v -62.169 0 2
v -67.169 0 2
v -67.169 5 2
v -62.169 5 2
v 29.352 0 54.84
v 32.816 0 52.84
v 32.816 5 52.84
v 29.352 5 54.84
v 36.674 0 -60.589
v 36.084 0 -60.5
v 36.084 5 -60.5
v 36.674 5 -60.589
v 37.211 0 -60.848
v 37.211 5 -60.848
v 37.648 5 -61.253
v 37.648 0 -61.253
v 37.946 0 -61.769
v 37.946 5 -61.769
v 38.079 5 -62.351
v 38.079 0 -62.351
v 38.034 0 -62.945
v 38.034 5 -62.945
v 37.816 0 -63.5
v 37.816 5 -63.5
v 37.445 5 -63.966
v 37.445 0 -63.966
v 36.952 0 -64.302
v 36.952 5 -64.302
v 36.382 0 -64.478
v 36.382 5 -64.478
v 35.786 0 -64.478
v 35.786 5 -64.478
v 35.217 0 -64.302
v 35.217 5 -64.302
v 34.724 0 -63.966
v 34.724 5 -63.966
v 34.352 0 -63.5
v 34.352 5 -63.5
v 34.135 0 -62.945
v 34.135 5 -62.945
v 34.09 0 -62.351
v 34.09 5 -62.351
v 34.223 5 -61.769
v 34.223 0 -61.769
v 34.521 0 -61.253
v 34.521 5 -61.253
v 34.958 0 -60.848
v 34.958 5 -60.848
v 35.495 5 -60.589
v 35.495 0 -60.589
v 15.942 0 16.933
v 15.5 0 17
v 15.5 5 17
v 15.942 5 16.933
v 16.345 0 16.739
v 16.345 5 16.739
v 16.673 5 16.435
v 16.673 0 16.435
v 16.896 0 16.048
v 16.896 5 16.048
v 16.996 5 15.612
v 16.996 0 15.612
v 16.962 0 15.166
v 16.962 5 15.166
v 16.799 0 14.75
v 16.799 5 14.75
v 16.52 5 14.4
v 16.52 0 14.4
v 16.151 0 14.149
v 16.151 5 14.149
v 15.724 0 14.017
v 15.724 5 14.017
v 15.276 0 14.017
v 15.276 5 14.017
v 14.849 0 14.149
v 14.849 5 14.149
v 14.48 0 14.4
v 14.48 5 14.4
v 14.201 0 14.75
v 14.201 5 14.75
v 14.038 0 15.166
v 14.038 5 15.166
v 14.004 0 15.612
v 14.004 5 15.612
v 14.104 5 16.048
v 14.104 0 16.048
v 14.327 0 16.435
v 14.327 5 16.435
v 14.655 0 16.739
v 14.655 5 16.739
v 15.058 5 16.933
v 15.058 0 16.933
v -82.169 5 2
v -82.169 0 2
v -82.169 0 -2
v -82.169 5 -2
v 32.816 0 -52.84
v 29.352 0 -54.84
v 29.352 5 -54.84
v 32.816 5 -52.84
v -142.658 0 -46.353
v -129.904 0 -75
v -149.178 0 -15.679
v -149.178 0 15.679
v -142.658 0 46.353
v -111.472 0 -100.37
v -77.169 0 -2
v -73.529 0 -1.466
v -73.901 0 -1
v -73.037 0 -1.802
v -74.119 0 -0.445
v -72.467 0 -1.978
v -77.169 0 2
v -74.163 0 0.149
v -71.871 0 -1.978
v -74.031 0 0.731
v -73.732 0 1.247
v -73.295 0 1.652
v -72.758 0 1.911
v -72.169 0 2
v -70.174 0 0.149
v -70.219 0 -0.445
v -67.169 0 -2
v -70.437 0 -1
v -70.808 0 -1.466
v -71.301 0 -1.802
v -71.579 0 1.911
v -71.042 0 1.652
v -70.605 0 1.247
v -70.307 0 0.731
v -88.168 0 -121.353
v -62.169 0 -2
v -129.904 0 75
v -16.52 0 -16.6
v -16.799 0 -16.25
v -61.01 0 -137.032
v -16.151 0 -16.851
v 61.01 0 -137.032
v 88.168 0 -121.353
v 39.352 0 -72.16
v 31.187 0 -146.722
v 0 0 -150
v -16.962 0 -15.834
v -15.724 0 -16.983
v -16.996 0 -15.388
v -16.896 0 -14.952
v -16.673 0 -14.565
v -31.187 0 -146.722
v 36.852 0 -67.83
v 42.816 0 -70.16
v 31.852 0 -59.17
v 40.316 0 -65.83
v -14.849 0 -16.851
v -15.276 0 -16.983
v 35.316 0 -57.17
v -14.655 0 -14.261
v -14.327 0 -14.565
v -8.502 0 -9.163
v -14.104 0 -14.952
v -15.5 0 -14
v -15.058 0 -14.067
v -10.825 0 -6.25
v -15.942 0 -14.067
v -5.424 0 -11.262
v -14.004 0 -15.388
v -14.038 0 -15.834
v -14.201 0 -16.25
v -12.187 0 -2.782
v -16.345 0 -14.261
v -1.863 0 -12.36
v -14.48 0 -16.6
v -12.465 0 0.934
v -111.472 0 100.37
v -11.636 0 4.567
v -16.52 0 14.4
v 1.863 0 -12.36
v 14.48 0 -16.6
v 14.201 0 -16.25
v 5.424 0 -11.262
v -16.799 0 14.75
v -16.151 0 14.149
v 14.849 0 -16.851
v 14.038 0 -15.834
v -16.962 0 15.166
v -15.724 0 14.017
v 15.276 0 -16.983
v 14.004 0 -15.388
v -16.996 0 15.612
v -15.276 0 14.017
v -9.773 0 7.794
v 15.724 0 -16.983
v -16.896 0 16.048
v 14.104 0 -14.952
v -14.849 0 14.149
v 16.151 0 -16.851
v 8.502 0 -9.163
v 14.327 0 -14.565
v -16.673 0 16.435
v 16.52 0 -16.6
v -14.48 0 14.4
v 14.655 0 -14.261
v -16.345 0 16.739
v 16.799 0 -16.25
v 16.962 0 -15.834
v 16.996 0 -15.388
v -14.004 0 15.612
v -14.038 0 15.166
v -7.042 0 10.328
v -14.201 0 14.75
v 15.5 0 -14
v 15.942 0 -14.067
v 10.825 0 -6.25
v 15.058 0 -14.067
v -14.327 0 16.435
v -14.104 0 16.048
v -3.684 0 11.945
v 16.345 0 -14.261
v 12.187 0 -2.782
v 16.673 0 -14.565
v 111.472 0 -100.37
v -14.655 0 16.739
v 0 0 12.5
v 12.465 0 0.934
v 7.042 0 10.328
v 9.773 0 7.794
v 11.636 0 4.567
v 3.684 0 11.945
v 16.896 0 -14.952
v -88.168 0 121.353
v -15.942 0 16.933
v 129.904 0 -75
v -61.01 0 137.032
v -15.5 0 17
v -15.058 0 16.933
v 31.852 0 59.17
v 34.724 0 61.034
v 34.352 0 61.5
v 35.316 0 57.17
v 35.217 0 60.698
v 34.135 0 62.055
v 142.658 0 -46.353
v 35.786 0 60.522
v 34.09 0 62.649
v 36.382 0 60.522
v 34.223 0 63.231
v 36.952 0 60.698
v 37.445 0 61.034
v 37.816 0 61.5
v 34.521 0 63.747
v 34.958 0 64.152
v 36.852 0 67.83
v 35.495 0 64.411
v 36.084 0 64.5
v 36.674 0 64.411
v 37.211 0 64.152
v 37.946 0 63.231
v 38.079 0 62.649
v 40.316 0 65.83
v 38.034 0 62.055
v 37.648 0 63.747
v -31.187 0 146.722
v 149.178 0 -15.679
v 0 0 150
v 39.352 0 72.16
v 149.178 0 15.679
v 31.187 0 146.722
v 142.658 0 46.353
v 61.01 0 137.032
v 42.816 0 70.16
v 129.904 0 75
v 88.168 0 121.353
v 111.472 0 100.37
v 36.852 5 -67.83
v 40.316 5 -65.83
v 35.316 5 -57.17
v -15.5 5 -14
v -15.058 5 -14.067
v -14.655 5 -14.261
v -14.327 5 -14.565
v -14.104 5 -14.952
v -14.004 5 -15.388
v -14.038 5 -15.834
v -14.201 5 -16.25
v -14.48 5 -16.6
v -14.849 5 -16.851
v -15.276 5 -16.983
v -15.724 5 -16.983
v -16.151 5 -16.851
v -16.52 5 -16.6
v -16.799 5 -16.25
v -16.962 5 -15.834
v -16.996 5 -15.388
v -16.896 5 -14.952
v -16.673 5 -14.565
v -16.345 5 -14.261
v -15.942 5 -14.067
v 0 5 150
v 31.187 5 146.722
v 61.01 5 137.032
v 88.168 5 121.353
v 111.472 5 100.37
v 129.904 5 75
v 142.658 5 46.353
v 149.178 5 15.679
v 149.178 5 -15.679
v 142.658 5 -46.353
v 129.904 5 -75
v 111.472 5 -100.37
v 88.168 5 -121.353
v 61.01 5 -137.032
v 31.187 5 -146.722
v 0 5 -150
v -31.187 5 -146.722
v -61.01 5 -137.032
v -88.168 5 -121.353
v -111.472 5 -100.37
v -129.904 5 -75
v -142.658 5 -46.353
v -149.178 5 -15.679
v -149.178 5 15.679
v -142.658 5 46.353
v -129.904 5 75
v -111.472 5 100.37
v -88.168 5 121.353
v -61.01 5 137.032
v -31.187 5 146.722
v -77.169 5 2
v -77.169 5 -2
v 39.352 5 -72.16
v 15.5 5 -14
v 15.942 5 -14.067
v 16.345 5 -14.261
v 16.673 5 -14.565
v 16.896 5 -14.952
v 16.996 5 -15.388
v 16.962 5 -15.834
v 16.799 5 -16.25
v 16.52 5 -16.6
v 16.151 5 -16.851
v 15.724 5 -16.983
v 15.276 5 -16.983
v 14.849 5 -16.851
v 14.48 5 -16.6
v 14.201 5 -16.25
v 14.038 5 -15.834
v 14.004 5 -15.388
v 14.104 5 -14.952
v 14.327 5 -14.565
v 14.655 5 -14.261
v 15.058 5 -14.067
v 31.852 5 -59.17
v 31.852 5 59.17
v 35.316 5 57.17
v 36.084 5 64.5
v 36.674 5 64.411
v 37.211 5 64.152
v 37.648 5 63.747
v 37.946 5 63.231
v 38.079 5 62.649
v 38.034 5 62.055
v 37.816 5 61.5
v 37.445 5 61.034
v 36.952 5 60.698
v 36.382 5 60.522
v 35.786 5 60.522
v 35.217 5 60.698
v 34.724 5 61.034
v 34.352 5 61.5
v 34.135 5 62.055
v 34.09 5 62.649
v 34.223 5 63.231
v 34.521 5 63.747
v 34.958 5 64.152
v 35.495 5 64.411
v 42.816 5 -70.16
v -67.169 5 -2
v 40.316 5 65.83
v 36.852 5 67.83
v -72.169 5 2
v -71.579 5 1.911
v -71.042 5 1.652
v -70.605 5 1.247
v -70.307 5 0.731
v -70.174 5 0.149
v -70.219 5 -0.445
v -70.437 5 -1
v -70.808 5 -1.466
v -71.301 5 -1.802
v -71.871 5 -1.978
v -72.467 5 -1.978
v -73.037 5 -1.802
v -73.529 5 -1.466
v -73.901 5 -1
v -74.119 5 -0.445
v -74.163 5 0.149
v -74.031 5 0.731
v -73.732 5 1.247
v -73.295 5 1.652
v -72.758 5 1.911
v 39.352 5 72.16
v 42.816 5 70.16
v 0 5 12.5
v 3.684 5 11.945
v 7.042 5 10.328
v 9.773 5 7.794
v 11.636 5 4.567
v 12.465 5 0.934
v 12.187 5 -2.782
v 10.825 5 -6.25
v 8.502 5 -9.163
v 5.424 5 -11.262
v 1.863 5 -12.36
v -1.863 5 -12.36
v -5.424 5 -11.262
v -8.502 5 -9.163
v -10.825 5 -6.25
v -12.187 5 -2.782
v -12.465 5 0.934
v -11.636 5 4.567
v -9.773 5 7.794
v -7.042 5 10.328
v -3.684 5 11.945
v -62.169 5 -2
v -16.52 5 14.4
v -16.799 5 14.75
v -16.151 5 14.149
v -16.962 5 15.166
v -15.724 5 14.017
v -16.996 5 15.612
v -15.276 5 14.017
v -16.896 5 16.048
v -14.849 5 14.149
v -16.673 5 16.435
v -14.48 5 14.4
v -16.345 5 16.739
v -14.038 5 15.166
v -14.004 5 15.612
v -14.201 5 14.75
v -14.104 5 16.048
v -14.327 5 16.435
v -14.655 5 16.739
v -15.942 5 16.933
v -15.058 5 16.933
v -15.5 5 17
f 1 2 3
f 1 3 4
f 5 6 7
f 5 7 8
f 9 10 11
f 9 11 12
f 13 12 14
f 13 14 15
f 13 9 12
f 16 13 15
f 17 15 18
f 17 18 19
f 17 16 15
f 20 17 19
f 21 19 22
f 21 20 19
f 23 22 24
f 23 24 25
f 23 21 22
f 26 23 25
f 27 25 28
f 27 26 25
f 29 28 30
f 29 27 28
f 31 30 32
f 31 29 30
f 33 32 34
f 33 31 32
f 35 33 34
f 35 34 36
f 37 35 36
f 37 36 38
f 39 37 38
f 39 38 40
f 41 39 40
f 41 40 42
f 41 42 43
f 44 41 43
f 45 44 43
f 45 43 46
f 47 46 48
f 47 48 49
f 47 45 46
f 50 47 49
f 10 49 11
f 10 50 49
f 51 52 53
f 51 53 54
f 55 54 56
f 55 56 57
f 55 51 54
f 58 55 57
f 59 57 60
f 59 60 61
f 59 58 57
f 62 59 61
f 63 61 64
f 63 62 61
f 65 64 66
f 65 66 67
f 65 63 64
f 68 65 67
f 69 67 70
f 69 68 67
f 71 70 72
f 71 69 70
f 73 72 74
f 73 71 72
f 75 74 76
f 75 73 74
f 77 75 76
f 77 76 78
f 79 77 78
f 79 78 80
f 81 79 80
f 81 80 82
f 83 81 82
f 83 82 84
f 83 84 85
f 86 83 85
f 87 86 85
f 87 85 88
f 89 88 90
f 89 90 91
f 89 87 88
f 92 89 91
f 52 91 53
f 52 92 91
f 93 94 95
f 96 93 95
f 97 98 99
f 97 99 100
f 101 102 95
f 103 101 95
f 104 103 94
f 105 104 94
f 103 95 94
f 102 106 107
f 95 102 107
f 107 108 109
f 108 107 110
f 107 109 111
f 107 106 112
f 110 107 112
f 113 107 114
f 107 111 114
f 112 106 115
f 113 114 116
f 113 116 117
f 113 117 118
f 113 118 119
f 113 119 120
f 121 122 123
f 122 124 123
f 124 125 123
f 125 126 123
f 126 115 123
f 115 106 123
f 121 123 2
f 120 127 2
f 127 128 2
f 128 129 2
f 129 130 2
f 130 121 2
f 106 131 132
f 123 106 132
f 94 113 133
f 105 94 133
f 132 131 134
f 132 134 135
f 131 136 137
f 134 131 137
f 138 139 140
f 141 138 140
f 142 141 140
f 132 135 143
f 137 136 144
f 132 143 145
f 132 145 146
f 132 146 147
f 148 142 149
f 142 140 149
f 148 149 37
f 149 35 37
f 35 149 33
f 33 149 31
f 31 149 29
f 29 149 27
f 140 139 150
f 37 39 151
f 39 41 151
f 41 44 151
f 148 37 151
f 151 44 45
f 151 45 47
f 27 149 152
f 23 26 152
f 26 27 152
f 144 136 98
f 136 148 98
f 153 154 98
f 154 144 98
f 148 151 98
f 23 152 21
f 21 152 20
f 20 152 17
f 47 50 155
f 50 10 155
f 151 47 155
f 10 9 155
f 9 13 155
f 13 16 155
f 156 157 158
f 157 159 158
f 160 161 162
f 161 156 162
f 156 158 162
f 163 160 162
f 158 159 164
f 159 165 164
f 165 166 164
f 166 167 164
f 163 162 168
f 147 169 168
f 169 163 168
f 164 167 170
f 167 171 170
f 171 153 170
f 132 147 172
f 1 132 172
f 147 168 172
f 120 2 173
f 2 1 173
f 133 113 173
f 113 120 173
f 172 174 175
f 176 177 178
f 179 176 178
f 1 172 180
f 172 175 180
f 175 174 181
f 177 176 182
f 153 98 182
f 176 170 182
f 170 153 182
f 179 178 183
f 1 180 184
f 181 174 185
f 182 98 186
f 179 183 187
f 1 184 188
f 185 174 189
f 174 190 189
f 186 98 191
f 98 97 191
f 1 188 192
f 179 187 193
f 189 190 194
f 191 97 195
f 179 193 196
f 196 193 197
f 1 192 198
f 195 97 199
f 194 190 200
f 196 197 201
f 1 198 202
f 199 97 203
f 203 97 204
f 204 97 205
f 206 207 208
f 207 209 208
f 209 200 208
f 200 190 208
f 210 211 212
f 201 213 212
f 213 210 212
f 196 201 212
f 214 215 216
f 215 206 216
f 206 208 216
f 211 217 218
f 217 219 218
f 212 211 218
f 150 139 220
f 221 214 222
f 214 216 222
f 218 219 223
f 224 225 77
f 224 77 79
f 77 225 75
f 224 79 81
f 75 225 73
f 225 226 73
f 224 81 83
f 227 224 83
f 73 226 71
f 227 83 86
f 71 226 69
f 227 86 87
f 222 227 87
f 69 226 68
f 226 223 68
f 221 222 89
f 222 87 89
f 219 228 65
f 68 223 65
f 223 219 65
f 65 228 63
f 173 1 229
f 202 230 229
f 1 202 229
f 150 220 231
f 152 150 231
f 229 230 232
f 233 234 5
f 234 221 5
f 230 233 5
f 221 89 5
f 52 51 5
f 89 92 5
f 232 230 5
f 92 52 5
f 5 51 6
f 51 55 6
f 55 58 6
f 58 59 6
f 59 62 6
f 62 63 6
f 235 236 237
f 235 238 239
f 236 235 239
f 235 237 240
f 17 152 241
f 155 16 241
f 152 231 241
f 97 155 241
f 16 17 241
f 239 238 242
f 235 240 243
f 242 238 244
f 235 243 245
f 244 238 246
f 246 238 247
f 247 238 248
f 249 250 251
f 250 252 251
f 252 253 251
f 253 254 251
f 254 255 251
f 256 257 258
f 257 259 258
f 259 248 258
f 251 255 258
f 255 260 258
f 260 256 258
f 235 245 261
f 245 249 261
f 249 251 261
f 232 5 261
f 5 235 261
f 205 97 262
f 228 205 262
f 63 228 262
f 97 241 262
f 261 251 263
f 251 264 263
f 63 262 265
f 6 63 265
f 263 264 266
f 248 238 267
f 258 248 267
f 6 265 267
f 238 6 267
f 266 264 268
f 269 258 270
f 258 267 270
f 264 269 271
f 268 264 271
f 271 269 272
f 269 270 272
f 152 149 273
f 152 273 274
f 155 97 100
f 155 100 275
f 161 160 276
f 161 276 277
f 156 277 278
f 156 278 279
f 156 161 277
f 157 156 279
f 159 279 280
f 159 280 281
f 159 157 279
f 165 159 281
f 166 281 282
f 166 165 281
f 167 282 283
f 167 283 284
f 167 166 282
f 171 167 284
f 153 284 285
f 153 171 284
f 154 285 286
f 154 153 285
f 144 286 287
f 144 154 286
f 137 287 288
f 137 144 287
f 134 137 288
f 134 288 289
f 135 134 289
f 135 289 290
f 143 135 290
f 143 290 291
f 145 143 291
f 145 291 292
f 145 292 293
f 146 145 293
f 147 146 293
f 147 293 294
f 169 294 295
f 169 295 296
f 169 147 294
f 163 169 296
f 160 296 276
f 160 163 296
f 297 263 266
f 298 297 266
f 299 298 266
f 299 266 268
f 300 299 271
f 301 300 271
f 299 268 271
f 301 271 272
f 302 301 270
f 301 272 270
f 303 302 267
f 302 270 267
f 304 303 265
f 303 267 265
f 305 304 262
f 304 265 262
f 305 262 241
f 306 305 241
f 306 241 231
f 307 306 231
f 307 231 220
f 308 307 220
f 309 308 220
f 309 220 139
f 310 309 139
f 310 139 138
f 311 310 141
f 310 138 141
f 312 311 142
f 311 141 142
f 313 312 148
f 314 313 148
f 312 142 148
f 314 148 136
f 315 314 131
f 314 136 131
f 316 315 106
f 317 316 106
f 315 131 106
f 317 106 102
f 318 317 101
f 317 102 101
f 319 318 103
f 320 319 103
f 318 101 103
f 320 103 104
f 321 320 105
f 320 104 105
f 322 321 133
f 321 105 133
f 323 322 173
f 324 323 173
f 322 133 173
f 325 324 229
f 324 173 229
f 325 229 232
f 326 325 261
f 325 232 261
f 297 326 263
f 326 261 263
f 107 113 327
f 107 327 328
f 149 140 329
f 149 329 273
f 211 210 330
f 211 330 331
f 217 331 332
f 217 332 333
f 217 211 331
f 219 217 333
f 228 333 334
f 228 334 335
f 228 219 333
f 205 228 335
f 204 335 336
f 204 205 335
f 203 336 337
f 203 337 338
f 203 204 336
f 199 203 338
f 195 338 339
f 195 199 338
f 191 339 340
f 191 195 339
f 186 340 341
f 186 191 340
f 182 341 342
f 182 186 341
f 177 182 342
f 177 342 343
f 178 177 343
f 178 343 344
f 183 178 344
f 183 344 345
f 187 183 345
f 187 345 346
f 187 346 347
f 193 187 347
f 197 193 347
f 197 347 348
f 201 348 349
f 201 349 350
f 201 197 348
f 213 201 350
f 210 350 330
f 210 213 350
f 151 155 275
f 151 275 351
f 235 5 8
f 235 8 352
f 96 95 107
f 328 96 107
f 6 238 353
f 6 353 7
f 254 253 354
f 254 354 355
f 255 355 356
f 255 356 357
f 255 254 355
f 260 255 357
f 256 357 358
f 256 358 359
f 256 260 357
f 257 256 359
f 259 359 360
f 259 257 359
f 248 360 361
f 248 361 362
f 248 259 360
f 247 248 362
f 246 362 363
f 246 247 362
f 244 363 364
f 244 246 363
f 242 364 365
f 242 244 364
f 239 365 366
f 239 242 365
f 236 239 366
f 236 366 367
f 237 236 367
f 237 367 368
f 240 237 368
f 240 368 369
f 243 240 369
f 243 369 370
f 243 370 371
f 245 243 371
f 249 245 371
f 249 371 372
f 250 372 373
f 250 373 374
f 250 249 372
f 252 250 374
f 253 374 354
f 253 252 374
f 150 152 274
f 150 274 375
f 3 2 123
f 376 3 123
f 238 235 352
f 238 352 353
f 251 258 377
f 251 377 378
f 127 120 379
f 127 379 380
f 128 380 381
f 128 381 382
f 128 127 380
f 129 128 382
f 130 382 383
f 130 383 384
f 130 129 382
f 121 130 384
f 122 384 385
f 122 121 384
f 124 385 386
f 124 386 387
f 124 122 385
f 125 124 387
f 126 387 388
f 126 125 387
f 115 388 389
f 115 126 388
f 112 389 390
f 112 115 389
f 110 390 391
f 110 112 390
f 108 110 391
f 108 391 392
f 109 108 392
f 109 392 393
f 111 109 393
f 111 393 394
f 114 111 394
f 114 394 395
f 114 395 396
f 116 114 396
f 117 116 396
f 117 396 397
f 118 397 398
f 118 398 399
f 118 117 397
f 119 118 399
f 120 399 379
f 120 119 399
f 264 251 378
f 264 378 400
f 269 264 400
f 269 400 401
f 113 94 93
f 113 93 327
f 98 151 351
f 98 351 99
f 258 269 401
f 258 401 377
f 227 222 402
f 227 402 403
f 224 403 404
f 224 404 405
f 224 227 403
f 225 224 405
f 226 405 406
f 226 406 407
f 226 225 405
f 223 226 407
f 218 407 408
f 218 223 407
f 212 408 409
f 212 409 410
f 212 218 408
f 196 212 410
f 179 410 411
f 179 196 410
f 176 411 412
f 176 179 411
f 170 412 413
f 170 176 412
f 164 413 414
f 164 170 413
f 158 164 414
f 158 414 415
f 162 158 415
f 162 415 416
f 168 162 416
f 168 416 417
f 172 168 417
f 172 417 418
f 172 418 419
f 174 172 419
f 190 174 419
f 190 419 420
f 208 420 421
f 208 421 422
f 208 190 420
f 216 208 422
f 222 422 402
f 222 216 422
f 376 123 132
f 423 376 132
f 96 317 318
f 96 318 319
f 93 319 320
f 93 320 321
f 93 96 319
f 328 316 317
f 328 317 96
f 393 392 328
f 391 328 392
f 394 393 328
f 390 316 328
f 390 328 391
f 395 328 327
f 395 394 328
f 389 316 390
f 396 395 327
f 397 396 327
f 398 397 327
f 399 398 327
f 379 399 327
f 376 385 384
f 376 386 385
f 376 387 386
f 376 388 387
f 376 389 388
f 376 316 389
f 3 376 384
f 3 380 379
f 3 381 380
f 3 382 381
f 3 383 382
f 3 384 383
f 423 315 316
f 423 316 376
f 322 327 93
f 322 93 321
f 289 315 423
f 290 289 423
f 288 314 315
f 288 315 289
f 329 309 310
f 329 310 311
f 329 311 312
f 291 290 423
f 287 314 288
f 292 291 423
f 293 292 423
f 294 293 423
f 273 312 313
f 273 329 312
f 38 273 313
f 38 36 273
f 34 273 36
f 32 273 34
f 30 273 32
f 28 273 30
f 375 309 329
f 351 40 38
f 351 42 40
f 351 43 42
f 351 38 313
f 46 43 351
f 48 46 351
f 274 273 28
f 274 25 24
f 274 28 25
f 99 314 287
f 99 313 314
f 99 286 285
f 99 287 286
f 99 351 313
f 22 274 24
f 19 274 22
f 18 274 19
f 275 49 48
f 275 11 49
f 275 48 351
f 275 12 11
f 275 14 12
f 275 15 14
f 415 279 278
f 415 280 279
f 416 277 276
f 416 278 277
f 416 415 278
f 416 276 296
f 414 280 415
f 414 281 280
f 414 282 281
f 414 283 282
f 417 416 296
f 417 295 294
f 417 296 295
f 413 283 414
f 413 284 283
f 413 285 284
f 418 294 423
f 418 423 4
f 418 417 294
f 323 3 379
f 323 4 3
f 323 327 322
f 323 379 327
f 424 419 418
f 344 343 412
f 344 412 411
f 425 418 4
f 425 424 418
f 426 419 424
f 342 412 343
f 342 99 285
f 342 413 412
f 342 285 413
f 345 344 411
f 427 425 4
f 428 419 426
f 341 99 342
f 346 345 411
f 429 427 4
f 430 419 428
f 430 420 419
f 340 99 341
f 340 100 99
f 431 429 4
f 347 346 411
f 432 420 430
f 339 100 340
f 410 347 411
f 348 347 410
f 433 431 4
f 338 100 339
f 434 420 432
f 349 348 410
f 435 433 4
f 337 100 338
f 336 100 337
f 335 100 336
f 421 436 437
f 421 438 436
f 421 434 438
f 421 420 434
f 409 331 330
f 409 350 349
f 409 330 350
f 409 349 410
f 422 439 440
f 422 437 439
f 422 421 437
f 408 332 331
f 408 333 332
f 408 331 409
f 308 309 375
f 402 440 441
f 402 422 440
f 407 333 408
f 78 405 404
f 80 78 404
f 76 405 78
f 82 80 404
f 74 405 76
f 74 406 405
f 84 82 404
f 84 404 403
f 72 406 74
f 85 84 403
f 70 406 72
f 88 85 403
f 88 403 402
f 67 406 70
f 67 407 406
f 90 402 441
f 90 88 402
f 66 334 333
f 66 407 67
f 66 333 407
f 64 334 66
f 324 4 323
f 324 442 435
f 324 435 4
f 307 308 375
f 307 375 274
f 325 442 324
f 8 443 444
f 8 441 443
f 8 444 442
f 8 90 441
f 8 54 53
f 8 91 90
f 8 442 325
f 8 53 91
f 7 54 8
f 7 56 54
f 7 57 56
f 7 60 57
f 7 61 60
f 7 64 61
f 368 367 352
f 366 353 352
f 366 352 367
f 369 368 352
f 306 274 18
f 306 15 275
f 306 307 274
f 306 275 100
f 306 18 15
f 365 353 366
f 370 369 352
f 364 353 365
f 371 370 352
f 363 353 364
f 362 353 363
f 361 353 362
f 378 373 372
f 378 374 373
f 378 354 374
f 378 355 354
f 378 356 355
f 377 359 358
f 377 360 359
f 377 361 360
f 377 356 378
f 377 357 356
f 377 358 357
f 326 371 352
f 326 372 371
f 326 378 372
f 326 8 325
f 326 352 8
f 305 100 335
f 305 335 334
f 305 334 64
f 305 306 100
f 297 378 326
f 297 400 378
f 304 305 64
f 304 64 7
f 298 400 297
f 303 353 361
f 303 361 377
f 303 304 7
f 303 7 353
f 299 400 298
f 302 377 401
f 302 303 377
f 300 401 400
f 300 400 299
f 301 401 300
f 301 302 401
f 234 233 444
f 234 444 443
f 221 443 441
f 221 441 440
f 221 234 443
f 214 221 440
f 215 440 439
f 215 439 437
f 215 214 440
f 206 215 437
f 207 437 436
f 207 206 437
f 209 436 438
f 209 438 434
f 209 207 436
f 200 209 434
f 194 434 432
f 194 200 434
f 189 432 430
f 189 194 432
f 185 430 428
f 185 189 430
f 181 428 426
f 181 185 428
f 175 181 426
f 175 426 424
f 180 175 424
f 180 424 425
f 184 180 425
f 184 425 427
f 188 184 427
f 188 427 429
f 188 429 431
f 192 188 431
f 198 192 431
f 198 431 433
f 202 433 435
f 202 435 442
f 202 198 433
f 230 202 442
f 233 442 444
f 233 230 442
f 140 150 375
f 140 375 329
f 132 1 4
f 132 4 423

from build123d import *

# Parameters (mm, degrees)
SKETCH_1_R      = 150
SKETCH_1_R_2    = 1.5
SKETCH_1_R_3    = 12.5
SKETCH_1_R_4    = 2
SKETCH_1_W      = 5
SKETCH_1_H      = 4
EXTRUDE_1_DEPTH = 5


with BuildPart() as part:
    # 草图1 → 凸台-拉伸1 (new body)
    with BuildSketch(Plane(origin=(0, 0, 0), x_dir=(1, 0, 0), z_dir=(0, 1, 0))):
        with Locations(Location((0, 0, 0), (0, 0, 270))):
            Circle(SKETCH_1_R)
        with Locations(Location((-15.5, 15.5, 0), (0, 0, 270))):
            Circle(SKETCH_1_R_2, mode=Mode.SUBTRACT)
        with Locations(Location((15.5, 15.5, 0), (0, 0, 270))):
            Circle(SKETCH_1_R_2, mode=Mode.SUBTRACT)
        with Locations(Location((15.5, -15.5, 0), (0, 0, 270))):
            Circle(SKETCH_1_R_2, mode=Mode.SUBTRACT)
        with Locations(Location((-15.5, -15.5, 0), (0, 0, 270))):
            Circle(SKETCH_1_R_2, mode=Mode.SUBTRACT)
        with Locations(Location((0, 0, 0), (0, 0, 270))):
            Circle(SKETCH_1_R_3, mode=Mode.SUBTRACT)
        with Locations(Location((-72.168783649, 0, 0), (0, 0, 270))):
            Circle(SKETCH_1_R_4, mode=Mode.SUBTRACT)
        with Locations(Location((36.084391824, 62.5, 0), (0, 0, 270))):
            Circle(SKETCH_1_R_4, mode=Mode.SUBTRACT)
        with Locations(Location((36.084391824, -62.5, 0), (0, 0, 270))):
            Circle(SKETCH_1_R_4, mode=Mode.SUBTRACT)
        Polygon((36.852341017, 67.830127019), (40.316442632, 65.830127019), (42.816442632, 70.160254038), (39.352341017, 72.160254038), align=None, mode=Mode.SUBTRACT)
        with Locations((-64.668783649, 0)):
            Rectangle(SKETCH_1_W, SKETCH_1_H, mode=Mode.SUBTRACT)
        with Locations((-79.668783649, 0)):
            Rectangle(SKETCH_1_W, SKETCH_1_H, mode=Mode.SUBTRACT)
        Polygon((29.352341017, 54.839745962), (32.816442632, 52.839745962), (35.316442632, 57.169872981), (31.852341017, 59.169872981), align=None, mode=Mode.SUBTRACT)
        Polygon((40.316442632, -65.830127019), (36.852341017, -67.830127019), (39.352341017, -72.160254038), (42.816442632, -70.160254038), align=None, mode=Mode.SUBTRACT)
        Polygon((32.816442632, -52.839745962), (29.352341017, -54.839745962), (31.852341017, -59.169872981), (35.316442632, -57.169872981), align=None, mode=Mode.SUBTRACT)
    extrude(amount=EXTRUDE_1_DEPTH)


solid = part.part
